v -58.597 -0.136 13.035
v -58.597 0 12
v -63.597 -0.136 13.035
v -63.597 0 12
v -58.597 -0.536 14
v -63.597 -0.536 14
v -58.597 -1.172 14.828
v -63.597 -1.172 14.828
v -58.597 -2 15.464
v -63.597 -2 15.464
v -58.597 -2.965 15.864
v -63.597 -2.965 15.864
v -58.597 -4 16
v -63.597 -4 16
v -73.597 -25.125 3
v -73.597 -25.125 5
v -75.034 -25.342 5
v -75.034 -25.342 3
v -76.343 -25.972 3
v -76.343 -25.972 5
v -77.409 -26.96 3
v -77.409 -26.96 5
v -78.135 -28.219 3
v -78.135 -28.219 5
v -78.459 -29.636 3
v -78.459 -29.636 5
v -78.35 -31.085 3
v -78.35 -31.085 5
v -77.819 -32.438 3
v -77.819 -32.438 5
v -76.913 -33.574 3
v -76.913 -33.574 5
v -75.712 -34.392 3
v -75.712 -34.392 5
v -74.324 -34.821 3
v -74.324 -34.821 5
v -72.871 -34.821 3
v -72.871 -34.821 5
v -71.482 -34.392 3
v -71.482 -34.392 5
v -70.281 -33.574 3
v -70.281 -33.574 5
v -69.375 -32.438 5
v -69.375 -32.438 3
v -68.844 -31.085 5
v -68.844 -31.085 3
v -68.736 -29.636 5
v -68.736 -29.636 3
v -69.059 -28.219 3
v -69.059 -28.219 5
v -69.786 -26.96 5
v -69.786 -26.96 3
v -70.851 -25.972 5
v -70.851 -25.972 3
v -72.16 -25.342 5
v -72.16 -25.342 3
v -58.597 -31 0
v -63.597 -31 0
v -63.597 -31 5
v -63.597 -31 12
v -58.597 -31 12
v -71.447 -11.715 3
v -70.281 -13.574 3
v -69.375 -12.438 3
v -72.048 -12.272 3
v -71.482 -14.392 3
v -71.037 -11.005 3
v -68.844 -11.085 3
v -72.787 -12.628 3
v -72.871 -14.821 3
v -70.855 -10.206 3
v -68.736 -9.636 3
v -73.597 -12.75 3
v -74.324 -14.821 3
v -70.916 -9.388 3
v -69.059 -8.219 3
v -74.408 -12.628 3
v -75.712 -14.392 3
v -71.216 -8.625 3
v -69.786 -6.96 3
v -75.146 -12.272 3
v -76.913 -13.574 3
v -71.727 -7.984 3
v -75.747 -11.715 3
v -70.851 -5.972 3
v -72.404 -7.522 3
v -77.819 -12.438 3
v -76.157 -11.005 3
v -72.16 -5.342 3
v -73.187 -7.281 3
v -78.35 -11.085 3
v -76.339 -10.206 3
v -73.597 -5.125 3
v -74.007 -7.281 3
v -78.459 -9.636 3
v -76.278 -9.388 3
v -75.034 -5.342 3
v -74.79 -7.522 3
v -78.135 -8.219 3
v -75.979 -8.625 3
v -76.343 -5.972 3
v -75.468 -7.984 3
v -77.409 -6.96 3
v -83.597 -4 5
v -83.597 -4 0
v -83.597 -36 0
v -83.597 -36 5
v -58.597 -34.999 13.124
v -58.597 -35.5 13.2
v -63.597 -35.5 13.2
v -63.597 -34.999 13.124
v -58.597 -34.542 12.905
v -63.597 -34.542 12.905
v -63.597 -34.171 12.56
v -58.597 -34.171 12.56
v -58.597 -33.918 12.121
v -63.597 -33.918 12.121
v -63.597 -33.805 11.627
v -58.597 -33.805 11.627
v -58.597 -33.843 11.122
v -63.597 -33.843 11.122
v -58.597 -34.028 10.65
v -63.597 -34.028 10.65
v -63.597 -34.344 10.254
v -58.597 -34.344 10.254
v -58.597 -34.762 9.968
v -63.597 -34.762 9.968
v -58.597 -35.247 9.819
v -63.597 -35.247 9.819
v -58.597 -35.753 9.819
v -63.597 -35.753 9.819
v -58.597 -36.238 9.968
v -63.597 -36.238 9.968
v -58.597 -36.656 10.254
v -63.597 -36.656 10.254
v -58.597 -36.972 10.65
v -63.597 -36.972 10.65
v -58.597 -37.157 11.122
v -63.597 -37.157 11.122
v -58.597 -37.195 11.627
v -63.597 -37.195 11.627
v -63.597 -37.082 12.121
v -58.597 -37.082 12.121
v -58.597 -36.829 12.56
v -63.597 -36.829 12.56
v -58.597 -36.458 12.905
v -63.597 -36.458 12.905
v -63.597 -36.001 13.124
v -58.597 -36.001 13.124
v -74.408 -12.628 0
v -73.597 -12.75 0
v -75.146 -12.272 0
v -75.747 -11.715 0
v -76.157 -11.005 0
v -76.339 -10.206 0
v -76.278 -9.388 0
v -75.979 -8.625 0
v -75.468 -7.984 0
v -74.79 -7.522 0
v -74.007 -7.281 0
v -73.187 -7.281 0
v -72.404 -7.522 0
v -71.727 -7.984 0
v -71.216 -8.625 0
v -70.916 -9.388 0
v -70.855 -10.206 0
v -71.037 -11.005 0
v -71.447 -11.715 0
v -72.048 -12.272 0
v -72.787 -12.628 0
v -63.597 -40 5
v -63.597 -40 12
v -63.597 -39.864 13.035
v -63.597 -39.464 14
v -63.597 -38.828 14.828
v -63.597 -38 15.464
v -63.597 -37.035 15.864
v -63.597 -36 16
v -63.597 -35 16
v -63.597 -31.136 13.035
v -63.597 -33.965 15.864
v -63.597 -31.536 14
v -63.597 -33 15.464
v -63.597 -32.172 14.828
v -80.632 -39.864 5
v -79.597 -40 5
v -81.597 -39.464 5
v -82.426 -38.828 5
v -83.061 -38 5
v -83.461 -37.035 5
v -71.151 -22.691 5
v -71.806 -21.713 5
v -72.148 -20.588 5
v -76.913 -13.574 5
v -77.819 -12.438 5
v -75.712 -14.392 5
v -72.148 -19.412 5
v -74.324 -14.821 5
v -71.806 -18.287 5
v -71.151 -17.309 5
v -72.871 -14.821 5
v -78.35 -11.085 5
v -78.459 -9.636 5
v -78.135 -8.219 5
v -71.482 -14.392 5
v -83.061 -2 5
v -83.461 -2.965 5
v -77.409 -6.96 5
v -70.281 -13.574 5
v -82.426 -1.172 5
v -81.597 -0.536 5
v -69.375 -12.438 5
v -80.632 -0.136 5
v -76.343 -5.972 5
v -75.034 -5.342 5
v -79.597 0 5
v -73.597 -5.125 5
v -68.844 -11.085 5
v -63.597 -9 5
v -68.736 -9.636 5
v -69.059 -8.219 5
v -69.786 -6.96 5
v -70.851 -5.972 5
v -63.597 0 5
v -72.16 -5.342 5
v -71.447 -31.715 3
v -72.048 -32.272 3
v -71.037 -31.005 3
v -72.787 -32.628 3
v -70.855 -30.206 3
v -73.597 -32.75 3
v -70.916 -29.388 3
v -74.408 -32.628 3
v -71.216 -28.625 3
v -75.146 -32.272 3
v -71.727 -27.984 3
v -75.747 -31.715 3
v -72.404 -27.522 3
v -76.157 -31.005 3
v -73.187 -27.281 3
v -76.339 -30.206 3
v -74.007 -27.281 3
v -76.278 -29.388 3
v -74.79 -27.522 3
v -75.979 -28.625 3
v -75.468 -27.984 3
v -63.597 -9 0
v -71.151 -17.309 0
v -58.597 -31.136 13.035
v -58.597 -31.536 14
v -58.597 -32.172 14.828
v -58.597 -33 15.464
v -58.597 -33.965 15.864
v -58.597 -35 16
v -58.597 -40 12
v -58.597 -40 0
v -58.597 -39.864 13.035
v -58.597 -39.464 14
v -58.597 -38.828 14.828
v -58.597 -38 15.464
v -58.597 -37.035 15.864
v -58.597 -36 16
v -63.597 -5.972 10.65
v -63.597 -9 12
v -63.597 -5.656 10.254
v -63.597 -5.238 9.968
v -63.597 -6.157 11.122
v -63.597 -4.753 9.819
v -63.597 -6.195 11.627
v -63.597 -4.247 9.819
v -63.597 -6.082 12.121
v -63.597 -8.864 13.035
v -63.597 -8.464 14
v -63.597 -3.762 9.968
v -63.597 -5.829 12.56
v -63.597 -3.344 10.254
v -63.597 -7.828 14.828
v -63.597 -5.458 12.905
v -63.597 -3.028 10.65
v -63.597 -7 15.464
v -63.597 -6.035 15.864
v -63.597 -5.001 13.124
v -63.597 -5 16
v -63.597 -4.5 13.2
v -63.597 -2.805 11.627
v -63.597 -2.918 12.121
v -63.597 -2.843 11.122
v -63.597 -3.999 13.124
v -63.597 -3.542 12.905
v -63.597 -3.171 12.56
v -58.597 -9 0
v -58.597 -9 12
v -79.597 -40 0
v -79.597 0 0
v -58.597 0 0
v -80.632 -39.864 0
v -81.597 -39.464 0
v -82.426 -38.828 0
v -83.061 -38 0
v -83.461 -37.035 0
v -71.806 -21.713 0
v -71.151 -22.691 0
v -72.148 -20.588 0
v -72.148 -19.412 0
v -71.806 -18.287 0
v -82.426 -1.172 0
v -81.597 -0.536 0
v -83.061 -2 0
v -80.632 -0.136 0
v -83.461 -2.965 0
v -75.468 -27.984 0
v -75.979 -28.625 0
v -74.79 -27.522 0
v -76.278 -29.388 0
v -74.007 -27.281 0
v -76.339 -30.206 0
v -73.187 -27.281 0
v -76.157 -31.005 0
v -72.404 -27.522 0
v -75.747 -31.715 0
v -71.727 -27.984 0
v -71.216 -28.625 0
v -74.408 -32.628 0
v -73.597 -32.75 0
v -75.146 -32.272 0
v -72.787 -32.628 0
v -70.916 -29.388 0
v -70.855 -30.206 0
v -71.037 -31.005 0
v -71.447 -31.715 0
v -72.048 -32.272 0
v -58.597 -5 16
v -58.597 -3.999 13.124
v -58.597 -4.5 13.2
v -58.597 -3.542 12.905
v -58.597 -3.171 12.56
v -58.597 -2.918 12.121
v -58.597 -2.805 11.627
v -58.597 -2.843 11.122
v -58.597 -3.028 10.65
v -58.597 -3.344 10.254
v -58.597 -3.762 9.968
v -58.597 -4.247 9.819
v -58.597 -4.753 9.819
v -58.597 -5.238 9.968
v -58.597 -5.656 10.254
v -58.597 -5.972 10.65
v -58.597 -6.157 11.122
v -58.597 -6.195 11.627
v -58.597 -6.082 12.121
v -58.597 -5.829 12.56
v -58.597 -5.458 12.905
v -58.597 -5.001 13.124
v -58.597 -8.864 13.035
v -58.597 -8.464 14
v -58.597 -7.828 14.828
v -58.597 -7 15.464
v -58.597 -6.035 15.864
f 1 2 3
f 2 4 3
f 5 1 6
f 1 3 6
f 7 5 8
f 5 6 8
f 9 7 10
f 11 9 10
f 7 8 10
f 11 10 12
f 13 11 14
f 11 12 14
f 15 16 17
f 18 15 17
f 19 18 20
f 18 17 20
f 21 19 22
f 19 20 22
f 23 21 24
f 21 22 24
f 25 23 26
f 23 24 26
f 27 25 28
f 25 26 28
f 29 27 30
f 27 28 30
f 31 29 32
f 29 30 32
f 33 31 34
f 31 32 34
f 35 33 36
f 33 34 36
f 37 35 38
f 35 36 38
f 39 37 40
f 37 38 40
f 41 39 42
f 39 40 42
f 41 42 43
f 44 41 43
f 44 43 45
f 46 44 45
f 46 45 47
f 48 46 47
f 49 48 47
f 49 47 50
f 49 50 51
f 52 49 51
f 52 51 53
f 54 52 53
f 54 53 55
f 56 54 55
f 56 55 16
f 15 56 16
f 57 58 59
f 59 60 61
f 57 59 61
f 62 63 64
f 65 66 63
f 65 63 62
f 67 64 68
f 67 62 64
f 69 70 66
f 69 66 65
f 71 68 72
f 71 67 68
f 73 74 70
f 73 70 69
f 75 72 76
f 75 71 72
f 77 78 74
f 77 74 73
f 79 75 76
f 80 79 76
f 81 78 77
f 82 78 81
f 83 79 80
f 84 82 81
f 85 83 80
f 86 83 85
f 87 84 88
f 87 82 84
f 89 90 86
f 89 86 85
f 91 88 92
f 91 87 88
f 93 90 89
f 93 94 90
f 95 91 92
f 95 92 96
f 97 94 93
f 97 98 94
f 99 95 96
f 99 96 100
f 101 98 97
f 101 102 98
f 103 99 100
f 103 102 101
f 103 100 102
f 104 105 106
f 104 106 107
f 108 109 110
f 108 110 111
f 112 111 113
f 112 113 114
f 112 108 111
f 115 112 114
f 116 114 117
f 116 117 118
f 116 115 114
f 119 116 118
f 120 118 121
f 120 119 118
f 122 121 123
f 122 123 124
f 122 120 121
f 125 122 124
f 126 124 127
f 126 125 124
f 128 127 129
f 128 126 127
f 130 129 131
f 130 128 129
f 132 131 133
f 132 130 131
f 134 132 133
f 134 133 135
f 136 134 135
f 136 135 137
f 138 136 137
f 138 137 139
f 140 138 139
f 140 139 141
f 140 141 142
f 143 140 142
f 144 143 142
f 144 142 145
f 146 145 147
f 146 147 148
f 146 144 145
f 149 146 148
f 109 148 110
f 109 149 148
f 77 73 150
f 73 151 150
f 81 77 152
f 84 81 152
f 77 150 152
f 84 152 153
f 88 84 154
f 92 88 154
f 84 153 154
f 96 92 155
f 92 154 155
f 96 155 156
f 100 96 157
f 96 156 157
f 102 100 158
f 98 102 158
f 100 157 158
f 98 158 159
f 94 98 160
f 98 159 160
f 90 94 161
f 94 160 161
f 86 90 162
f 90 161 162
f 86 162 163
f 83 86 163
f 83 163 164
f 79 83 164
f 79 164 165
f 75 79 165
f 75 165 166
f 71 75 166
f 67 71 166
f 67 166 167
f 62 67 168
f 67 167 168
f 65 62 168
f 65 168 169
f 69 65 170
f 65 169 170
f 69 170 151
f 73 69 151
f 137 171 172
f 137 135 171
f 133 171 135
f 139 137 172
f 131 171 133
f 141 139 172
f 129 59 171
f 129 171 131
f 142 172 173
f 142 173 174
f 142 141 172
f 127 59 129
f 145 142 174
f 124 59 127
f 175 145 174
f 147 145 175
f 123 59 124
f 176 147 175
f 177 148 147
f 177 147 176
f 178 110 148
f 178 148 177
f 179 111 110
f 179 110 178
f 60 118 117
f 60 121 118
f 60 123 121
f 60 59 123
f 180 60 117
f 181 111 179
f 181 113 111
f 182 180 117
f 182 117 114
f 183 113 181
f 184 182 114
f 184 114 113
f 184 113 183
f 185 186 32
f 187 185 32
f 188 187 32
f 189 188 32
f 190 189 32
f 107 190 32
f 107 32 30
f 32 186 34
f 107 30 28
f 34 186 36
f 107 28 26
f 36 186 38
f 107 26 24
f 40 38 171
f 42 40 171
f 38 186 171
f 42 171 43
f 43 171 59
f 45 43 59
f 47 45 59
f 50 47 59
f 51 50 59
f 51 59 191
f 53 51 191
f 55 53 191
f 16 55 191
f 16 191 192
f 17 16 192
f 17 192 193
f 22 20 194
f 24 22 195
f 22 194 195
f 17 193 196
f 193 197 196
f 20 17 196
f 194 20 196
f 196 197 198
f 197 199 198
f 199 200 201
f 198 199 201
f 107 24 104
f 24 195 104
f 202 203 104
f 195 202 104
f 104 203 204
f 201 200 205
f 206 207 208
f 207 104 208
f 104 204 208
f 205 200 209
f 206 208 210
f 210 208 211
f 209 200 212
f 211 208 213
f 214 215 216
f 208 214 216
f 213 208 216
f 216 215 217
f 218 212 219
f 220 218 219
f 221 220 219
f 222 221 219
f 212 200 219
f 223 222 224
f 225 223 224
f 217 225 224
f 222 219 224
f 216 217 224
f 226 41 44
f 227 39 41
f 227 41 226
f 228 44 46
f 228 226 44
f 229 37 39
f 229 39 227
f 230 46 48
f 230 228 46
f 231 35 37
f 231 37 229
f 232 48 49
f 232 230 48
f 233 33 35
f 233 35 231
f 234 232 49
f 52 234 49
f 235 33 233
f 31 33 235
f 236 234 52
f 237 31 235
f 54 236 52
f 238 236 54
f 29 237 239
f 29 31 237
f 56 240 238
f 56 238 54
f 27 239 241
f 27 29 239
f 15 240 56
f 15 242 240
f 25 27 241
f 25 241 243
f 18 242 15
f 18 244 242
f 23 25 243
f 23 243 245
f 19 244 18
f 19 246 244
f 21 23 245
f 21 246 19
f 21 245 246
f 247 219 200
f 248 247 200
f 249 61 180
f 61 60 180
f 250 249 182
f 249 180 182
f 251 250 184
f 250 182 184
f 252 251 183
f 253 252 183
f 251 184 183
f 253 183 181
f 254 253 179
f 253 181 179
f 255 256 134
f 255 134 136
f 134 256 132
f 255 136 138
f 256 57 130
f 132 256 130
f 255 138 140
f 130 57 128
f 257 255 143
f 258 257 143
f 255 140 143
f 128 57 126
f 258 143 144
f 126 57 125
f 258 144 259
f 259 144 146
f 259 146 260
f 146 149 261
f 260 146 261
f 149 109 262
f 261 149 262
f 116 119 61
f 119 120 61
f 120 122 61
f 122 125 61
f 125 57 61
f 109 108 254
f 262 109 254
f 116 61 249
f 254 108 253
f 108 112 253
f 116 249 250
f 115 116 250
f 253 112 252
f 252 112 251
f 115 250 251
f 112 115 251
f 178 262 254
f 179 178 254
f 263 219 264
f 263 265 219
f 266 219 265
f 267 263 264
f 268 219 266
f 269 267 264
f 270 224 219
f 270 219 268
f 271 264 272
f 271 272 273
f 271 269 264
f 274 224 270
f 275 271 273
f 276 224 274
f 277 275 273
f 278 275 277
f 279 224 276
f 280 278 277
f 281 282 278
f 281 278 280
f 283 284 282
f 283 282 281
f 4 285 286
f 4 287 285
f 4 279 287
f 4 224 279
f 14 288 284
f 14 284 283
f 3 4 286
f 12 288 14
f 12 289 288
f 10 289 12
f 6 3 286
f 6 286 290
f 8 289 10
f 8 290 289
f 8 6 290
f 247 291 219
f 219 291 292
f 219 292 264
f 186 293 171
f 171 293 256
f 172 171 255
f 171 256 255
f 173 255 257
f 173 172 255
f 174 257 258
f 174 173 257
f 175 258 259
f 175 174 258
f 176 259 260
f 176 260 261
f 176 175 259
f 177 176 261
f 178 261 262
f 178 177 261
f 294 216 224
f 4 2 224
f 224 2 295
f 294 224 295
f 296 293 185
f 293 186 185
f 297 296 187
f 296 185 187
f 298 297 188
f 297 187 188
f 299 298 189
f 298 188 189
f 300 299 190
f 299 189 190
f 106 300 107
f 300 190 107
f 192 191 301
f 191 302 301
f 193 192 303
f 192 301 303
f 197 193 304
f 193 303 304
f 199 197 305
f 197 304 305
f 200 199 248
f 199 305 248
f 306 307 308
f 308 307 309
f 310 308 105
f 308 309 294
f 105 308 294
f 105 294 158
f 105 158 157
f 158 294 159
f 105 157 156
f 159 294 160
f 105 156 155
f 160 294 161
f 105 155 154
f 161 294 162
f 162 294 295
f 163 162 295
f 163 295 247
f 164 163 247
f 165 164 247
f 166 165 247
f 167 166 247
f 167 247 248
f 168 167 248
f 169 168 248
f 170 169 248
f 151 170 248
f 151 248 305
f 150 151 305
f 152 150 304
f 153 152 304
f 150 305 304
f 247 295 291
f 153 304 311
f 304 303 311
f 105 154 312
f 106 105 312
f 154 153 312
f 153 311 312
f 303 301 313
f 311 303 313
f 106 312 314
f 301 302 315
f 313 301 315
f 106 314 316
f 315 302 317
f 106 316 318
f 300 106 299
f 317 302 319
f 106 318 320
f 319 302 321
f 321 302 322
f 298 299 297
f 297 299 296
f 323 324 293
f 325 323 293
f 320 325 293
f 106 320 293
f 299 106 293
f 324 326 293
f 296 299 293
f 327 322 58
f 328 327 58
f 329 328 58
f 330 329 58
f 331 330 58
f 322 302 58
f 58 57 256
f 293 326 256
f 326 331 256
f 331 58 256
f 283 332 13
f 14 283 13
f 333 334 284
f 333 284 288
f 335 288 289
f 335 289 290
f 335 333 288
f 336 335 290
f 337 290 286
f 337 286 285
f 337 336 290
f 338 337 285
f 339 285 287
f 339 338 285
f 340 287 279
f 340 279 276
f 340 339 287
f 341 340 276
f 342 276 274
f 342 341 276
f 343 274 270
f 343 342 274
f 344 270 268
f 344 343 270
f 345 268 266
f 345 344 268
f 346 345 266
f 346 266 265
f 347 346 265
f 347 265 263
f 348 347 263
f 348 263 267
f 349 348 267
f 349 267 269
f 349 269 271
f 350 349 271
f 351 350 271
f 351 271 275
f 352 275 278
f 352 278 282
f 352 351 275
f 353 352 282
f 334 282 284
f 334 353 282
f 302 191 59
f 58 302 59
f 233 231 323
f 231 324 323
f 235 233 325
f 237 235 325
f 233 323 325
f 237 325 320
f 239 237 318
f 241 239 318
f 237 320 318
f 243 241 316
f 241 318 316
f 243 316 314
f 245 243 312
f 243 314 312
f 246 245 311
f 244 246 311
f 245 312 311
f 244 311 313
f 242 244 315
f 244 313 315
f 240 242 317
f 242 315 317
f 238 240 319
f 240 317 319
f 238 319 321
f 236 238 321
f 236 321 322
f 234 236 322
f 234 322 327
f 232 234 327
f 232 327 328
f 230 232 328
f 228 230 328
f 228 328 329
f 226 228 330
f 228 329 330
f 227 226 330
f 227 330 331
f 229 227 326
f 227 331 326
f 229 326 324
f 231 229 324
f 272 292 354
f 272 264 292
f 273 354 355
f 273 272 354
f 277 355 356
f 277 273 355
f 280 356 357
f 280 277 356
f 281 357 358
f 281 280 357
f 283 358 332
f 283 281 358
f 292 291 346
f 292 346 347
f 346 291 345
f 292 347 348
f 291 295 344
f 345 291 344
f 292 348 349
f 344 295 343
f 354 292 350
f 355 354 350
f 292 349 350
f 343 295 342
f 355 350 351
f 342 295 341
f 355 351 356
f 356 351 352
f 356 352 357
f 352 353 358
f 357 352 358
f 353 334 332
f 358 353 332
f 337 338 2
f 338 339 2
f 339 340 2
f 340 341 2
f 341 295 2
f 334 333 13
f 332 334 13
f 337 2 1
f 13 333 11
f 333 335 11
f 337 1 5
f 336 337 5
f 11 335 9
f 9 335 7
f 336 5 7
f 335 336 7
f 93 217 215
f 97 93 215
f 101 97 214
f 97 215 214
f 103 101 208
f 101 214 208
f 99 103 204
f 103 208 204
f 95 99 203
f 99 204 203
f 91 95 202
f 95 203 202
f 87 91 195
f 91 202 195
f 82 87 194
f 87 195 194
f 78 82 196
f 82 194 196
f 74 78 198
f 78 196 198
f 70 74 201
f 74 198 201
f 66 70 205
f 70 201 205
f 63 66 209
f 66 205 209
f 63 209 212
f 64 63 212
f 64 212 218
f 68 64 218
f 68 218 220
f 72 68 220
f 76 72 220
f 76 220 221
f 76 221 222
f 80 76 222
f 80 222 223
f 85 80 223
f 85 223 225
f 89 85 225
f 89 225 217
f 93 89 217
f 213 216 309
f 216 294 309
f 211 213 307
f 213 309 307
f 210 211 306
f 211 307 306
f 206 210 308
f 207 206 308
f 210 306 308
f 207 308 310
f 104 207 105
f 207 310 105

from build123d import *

# Parameters (mm, degrees)
F0_W           = 11
F0_H           = 9
F0_R           = 1.7
F1_DEPTH       = 5
F2_DEPTH       = 25
F4_D           = 5.5
F4_CBORE_D     = 9.75
F4_CBORE_DEPTH = 2
F5_DEPTH       = 5.001
F6_R           = 4
F7_ANGLE       = 90


# Not quite as in the source:
# - a feature names something its author has since deleted; it is built from what else it names


with BuildPart() as f1:
    # F0 (on Top) → F1 (new body)
    with BuildSketch(Plane.XY):
        with Locations((-48.0971363783, -35.5)):
            Rectangle(F0_W, F0_H)
        with Locations((-47.0971363783, -35.5)):
            Circle(F0_R, mode=Mode.SUBTRACT)
    extrude(amount=F1_DEPTH)



with BuildPart() as f1b:
    # F0 (on Top) → F1, piece 2 (new body)
    with BuildSketch(Plane.XY):
        with Locations((-48.0971363783, -4.5)):
            Rectangle(F0_W, F0_H)
        with Locations((-47.0971363783, -4.5)):
            Circle(F0_R, mode=Mode.SUBTRACT)
    extrude(amount=F1_DEPTH)


with BuildPart() as f1_1:
    add(f1.part)

    add(f1b.part)  # F2 merges F1b
    # F0 (on Top) → F2 (join)
    with BuildSketch(Plane.XY):
        Polygon((-58.5971363783, -40), (-53.5971363783, -40), (-53.5971363783, -31), (-53.5971363783, -9), (-53.5971363783, 0), (-58.5971363783, 0), align=None)
    extrude(amount=F2_DEPTH)

    # F4 (through all)
    with Locations(Plane.YZ.offset(-53.5971363783)):
        with Locations((-10, 15), (-30, 15)):
            CounterBoreHole(F4_D / 2, F4_CBORE_D / 2, F4_CBORE_DEPTH)

    # F3 (on face) → F5 (cut, through all)
    with BuildSketch(Plane.YZ.offset(-53.5971363783)):
        Polygon((-20, 15), (-31, 5), (-31, 0), (-9, 0), (-9, 5), align=None)
    extrude(amount=-F5_DEPTH, mode=Mode.SUBTRACT)

    # F6
    f6_edges = [f1_1.edges().sort_by_distance(p)[0] for p in [
        (-42.597136, 0, 2.5),
        (-42.597136, -40, 2.5),
        (-56.097136, -40, 25),
        (-56.097136, 0, 25),
        (-42.597136, -9, 2.5),
        (-42.597136, -31, 2.5),
        (-56.097136, -20, 15),
    ]]
    fillet(f6_edges, radius=F6_R)


with BuildPart() as f1_2:
    # F7: moved
    add(f1_1.part.rotate(Axis((-58.5971363783, -20, 0), (0, -1, 0)), F7_ANGLE))


solid = f1_2.part
